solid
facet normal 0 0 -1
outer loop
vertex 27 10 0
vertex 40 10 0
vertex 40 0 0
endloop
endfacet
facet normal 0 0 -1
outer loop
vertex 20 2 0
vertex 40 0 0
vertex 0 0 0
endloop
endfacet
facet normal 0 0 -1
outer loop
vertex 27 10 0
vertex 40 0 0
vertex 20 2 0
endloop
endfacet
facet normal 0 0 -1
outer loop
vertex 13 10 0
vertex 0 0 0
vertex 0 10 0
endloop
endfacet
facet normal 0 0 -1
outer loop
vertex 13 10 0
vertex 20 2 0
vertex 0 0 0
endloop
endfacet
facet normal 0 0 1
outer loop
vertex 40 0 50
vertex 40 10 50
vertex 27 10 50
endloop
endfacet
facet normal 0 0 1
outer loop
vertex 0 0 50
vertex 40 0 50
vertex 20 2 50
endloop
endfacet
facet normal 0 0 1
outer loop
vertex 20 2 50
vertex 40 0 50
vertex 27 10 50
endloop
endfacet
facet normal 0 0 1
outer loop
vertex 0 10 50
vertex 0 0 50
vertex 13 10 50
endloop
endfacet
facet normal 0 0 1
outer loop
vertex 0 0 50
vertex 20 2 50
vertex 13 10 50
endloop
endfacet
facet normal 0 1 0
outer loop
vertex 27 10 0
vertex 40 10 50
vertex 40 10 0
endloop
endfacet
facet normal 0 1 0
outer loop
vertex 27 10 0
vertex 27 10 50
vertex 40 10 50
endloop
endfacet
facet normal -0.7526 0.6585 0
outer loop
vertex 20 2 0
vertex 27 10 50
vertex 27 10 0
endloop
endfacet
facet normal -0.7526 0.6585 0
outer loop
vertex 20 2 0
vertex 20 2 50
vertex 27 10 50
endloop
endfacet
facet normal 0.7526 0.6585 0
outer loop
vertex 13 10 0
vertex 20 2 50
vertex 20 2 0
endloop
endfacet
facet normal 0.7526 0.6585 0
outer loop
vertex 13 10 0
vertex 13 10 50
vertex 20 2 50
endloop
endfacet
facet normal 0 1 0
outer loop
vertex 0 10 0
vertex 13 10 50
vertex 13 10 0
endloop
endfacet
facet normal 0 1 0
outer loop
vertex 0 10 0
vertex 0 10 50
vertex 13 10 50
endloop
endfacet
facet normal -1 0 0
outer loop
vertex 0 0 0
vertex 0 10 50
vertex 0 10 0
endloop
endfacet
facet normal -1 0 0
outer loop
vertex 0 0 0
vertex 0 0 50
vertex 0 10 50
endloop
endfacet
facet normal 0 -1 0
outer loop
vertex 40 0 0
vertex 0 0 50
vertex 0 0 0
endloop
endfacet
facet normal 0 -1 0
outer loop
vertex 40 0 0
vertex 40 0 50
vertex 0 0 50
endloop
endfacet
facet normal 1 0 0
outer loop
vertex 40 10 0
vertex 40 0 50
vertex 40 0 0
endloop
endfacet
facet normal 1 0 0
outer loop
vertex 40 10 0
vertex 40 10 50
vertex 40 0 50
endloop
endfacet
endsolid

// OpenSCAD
$fn = 32;

// ----------------------------------------------------------------------
// V guide rail: vway, 40 mm wide
// ----------------------------------------------------------------------

// --- parameters (mm) ---
rail_w = 40;              // rail width, X
base_t = 10;              // base plate thickness
v_depth = 8;              // V feature depth / height
v_half_w = 7;             // half width of the V at the base face
plate_t = 50;             // rail length, Z (the extrusion height)

profile = [[0, 0], [40, 0], [40, 10], [27, 10], [20, 2], [13, 10], [0, 10]];  // primary outline, 7 points, counter clockwise

// --- the one profile operation ---
linear_extrude(height = plate_t) polygon(points = profile);
